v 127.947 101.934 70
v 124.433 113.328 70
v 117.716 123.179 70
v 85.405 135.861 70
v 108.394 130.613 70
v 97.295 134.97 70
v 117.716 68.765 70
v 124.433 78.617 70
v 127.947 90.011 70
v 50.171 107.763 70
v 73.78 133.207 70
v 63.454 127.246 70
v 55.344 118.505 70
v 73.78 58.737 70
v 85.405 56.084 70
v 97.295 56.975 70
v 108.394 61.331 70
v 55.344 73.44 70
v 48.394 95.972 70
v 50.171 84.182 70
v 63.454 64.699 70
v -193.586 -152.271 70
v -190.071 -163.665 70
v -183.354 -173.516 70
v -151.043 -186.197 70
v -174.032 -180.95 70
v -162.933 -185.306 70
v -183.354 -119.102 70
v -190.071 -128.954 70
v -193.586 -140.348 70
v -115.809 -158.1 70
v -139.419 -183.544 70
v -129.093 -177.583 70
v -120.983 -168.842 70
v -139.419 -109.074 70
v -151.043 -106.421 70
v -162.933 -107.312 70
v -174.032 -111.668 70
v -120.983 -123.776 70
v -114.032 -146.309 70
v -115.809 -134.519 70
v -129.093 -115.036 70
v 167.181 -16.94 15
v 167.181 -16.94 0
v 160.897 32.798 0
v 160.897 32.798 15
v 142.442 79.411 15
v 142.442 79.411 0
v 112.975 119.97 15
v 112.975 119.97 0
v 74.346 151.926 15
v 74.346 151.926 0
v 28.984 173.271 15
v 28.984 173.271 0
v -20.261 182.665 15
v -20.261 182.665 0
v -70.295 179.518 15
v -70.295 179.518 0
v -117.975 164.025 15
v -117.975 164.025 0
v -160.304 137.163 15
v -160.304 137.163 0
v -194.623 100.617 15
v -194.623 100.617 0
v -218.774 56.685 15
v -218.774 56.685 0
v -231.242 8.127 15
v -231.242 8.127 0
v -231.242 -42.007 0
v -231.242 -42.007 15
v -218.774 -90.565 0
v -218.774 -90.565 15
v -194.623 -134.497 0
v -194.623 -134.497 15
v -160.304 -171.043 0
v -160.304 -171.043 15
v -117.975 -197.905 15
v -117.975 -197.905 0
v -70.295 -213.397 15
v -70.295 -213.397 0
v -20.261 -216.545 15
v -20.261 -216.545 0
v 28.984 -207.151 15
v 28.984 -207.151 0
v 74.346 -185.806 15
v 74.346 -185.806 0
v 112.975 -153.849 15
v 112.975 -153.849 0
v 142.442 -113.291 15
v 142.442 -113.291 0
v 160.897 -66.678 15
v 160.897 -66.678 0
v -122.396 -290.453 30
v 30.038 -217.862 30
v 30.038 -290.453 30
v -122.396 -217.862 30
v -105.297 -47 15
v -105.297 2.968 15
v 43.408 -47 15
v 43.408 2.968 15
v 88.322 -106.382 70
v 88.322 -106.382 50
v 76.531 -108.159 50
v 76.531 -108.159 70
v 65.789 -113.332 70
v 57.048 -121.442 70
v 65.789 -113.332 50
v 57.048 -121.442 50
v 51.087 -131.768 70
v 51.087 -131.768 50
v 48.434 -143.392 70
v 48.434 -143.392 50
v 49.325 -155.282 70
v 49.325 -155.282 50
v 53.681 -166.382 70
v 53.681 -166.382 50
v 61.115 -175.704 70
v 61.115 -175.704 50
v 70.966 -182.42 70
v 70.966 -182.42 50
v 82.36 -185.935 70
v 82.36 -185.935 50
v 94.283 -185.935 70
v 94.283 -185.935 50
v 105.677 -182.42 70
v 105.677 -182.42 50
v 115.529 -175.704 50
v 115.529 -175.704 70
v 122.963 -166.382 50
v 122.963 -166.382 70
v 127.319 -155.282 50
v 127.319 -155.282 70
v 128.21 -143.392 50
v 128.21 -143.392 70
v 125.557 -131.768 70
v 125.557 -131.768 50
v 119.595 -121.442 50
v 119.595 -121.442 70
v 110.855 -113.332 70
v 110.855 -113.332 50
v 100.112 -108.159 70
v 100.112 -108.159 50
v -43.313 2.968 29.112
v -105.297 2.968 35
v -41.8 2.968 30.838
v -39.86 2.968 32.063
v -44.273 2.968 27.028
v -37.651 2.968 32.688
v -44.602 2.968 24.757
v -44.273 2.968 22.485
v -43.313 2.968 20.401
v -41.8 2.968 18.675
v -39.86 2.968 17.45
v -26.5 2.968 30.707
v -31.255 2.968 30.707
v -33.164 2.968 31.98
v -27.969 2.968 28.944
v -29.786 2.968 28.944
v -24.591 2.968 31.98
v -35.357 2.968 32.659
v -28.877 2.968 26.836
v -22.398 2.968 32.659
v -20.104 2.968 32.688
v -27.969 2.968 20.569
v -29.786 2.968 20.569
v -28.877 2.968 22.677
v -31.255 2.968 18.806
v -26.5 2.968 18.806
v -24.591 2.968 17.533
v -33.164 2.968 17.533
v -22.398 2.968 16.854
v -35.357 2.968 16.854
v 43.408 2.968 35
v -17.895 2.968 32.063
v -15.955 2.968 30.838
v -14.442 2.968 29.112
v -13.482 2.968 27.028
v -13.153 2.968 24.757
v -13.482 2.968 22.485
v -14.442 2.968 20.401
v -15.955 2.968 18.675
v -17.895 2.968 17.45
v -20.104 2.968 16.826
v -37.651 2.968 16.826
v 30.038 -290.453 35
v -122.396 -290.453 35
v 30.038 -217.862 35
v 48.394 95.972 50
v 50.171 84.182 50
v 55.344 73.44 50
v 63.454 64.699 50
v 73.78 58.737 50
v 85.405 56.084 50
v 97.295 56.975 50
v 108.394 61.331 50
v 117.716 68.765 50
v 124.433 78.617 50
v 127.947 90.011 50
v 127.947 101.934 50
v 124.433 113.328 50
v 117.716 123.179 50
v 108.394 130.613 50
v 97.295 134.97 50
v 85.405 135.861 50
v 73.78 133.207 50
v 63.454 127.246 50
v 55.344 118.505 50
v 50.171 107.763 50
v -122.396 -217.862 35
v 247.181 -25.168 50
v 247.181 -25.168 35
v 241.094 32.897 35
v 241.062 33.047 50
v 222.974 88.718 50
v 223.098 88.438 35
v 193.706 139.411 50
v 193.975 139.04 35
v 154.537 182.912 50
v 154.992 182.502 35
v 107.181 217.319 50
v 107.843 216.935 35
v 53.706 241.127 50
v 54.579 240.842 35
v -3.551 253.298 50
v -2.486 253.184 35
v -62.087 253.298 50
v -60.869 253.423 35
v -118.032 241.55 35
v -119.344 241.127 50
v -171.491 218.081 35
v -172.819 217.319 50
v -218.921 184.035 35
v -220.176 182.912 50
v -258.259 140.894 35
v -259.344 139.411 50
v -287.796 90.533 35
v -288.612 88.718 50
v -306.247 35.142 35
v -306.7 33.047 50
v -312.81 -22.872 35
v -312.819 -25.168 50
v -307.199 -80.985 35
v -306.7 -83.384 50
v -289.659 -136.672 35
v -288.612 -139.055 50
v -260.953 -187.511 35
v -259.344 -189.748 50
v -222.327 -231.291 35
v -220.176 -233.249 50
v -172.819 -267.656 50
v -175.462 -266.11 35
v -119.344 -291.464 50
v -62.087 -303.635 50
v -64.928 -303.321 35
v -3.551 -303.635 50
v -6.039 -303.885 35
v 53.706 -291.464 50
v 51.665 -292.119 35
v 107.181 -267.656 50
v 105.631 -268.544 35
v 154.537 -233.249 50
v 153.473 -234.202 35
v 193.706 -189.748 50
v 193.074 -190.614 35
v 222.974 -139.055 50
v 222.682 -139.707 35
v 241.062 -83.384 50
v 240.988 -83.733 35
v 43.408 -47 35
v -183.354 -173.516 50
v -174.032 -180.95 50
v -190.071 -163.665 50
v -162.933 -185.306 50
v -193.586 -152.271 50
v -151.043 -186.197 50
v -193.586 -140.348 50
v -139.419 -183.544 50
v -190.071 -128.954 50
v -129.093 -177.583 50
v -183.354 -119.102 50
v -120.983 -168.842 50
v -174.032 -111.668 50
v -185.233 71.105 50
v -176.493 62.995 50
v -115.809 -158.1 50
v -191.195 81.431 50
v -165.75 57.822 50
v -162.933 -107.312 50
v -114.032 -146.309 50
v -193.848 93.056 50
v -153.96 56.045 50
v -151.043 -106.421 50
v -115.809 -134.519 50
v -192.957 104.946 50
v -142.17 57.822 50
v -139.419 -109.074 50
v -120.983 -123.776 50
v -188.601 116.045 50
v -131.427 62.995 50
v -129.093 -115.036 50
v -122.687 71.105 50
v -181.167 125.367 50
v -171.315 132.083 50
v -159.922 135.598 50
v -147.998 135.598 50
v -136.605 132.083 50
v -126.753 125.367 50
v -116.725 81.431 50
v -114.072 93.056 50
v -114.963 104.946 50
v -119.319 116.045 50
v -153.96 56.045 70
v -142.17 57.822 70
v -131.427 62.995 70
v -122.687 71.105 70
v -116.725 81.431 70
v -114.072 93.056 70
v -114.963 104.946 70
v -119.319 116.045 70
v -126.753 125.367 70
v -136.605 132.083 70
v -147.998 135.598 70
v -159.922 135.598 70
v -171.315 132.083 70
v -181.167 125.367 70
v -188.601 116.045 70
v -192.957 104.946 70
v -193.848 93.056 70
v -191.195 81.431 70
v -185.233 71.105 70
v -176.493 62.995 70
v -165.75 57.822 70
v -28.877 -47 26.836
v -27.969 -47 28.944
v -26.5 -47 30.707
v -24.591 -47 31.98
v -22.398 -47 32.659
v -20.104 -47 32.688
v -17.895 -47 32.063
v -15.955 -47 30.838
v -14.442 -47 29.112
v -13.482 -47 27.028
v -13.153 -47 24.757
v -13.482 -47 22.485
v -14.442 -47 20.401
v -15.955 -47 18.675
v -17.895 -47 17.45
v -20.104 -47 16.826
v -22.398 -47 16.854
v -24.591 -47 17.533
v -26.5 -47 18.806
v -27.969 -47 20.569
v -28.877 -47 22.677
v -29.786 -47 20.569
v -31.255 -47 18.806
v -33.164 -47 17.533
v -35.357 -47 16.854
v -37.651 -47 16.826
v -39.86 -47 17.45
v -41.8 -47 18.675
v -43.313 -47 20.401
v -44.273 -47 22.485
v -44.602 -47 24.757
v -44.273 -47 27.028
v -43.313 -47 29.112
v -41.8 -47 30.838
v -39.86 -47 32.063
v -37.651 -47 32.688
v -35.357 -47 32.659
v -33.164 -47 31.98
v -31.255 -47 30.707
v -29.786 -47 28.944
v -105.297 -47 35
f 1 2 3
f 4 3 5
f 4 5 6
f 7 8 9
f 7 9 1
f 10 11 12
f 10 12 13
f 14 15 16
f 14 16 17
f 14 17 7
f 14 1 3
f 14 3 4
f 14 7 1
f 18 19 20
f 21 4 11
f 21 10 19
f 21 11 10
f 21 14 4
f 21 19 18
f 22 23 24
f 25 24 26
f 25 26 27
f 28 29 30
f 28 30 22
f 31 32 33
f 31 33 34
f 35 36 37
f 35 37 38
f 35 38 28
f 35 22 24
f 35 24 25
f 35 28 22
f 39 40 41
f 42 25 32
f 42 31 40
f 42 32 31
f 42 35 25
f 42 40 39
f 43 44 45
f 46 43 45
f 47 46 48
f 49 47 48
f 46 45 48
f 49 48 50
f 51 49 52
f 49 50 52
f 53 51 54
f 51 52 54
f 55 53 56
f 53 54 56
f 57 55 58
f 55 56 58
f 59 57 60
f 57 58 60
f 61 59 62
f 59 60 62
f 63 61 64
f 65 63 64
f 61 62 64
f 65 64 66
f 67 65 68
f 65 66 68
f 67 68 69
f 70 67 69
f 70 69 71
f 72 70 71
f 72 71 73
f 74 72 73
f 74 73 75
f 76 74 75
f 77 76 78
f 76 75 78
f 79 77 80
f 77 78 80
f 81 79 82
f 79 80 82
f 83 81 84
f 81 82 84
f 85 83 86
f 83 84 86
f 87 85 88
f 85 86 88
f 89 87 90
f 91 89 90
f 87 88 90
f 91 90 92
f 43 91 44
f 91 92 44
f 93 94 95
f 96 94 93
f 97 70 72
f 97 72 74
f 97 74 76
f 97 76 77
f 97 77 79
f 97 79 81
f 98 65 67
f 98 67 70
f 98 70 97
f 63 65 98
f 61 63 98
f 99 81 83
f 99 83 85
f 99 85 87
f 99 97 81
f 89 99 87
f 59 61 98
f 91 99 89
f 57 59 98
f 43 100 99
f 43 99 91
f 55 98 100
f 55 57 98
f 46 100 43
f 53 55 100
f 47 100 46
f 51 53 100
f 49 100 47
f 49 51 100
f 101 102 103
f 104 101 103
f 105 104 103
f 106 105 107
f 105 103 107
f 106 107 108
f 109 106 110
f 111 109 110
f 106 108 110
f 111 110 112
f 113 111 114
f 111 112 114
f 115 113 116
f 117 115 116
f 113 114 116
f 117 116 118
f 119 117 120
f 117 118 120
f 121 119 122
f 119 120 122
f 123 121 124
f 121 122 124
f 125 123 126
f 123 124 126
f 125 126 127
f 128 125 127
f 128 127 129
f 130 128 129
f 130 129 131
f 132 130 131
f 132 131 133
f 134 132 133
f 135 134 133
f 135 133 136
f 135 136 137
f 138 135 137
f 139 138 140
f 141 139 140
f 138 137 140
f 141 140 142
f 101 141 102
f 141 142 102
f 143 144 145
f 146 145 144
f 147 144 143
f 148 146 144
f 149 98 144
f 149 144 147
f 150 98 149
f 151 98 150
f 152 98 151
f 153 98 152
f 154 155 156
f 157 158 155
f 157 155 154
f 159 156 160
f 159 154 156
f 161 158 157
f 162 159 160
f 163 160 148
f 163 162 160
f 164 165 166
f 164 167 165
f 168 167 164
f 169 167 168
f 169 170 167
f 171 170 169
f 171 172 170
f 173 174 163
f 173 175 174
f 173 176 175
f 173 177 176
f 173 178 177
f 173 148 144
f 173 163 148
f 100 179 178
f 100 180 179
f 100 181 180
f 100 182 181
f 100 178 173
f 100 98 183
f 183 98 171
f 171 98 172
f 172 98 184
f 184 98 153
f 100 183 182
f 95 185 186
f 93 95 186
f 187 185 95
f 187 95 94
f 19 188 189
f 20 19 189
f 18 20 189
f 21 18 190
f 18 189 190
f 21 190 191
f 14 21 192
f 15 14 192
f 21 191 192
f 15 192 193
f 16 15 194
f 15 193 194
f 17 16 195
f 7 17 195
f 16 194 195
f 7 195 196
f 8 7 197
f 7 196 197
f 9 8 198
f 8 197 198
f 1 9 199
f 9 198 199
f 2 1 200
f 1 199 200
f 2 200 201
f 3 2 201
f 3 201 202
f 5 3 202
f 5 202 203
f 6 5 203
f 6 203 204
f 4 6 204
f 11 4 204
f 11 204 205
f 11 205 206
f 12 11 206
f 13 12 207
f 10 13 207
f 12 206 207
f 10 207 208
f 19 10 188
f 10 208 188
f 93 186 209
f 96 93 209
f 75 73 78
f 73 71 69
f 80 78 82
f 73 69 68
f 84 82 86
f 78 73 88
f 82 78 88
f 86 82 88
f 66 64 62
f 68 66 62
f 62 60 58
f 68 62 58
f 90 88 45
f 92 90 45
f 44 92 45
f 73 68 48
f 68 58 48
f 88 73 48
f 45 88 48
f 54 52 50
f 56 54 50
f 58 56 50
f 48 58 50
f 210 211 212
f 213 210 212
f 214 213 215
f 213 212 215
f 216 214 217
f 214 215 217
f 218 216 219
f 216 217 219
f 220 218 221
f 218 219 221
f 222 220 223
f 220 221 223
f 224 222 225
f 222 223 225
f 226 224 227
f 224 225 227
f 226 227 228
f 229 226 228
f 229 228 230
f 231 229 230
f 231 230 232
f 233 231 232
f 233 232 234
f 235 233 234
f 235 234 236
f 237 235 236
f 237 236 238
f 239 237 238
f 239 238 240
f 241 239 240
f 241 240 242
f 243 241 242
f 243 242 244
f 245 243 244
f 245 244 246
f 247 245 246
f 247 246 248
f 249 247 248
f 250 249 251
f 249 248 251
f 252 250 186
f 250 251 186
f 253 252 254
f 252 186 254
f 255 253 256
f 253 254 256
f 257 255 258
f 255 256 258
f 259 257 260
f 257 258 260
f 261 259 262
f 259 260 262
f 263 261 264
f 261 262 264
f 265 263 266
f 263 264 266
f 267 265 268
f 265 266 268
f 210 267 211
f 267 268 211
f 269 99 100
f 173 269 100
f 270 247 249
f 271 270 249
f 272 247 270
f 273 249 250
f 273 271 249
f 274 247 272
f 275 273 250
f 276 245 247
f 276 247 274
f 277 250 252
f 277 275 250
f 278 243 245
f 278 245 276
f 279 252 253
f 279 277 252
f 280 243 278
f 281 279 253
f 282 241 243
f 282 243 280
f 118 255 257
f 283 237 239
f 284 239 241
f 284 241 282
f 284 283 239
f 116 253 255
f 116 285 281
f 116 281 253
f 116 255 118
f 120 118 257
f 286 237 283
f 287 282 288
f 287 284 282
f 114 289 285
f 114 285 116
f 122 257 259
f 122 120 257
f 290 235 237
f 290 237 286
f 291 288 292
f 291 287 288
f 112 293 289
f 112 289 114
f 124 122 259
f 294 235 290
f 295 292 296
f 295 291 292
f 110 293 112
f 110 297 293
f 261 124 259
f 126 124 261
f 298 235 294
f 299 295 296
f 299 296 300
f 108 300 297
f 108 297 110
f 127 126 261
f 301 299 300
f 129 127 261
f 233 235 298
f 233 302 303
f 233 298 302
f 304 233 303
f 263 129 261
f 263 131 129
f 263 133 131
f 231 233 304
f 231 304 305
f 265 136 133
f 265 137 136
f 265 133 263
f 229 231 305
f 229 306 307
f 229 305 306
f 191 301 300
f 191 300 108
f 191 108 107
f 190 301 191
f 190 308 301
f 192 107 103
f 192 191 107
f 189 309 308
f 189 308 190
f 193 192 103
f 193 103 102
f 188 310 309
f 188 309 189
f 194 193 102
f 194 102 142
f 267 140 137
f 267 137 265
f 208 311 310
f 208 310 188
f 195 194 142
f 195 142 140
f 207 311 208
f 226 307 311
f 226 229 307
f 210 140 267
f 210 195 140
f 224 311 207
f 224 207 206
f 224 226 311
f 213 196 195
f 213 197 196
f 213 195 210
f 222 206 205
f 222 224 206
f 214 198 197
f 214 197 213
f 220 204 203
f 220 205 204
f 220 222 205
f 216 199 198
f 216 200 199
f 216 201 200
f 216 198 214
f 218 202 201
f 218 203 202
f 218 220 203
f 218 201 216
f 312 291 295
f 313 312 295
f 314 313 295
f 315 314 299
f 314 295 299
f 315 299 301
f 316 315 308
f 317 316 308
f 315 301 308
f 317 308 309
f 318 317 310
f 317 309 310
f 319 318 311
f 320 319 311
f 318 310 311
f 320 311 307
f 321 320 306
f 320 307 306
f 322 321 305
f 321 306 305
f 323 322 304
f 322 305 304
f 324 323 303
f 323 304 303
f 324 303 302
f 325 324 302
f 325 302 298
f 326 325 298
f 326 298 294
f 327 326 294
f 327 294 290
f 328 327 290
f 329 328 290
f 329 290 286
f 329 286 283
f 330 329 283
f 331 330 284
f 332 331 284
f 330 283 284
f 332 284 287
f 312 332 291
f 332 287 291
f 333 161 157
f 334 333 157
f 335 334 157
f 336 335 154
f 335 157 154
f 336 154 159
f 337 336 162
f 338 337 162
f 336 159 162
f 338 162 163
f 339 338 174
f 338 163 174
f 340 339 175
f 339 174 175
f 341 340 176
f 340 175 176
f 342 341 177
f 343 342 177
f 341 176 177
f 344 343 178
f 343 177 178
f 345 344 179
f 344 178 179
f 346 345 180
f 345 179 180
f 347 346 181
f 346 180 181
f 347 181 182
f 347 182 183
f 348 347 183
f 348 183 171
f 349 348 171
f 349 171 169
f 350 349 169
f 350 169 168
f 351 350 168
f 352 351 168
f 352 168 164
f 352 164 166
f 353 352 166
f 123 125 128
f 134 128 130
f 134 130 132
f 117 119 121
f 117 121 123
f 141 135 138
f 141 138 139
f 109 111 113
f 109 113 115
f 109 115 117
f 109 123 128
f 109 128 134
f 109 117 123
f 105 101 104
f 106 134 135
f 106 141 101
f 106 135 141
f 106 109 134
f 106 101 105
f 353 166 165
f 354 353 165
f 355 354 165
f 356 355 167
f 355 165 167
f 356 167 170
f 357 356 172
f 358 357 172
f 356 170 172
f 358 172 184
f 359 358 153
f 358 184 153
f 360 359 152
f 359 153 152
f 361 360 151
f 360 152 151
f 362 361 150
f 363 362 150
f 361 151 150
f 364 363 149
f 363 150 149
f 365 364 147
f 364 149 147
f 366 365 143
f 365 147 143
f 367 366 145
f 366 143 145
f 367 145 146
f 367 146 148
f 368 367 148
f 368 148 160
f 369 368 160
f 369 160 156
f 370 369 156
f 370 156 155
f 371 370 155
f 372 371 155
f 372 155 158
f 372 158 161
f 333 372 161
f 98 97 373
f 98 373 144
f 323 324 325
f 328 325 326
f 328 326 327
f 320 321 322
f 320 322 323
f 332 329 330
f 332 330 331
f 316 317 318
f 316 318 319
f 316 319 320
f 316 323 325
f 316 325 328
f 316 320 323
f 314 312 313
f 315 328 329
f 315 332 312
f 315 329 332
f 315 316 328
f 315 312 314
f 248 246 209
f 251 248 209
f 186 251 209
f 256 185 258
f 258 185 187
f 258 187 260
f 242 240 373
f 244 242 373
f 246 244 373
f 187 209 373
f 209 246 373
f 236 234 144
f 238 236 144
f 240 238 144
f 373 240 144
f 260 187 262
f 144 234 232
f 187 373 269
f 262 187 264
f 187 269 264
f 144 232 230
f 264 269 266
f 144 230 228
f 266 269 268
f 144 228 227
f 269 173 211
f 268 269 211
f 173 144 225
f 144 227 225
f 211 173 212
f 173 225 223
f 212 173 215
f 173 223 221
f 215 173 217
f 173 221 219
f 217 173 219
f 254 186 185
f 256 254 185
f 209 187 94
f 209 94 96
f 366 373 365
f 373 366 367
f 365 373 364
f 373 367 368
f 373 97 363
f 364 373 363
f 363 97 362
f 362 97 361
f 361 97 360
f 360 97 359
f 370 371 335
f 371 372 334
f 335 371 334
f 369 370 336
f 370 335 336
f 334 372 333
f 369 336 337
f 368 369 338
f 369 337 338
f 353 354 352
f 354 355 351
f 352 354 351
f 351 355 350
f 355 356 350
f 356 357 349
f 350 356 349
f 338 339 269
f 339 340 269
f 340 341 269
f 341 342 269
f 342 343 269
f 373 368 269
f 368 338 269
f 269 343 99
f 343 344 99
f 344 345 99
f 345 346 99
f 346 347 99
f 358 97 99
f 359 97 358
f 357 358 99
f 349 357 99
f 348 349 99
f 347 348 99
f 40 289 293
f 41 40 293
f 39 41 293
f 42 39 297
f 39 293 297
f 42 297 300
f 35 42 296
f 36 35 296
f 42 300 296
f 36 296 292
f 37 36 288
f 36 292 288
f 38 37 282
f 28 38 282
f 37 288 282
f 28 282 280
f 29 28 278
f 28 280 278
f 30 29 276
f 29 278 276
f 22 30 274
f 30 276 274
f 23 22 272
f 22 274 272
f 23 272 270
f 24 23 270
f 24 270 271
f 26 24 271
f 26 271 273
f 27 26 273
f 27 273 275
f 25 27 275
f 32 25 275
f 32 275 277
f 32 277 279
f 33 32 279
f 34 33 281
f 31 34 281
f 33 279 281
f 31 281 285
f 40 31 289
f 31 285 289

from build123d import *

# Parameters (mm, degrees)
SKETCH1_R           = 200
BOSS_EXTRUDE1_DEPTH = 15
SKETCH2_W           = 148.705267073
SKETCH2_H           = 49.968568036
BOSS_EXTRUDE2_DEPTH = 20
CUT_EXTRUDE2_DEPTH  = 103
SKETCH4_R           = 280
BOSS_EXTRUDE3_DEPTH = 15
SKETCH6_R           = 40
BOSS_EXTRUDE4_DEPTH = 20
CIRPATTERN1_COUNT   = 4
SKETCH7_W           = 152.434020428
SKETCH7_H           = 72.590976785
BOSS_EXTRUDE5_DEPTH = 5


with BuildPart() as part:
    # Sketch1 → Boss-Extrude1 (new body)
    with BuildSketch(Plane.XY):
        with Locations((-32.819152061, -16.939919955)):
            Circle(SKETCH1_R)
    extrude(amount=BOSS_EXTRUDE1_DEPTH)

    # Sketch2 → Boss-Extrude2 (add)
    with BuildSketch(Plane.XY.offset(15)):
        with Locations((-30.944542613, -22.016117064)):
            Rectangle(SKETCH2_W, SKETCH2_H)
    extrude(amount=BOSS_EXTRUDE2_DEPTH)

    # Sketch3 → Cut-Extrude2 (cut)
    with BuildSketch(Plane(origin=(0, 2.968166954, 0), x_dir=(1, 0, 0), z_dir=(0, 1, 0))):
        with BuildLine():
            ThreePointArc((-28.877479091, -22.677000866), (-44.602439558, -24.756660882), (-28.877479091, -26.836320898))
            ThreePointArc((-28.877479091, -26.836320898), (-13.152518624, -24.756660882), (-28.877479091, -22.677000866))
        make_face()
    extrude(amount=-CUT_EXTRUDE2_DEPTH, mode=Mode.SUBTRACT)

    # Sketch4 → Boss-Extrude3 (add)
    with BuildSketch(Plane.XY.offset(35)):
        with Locations((-32.819152061, -25.168448638)):
            Circle(SKETCH4_R)
    extrude(amount=BOSS_EXTRUDE3_DEPTH)

    # Sketch6 → Boss-Extrude4 (add)
    with BuildSketch(Plane.XY.offset(50)):
        with Locations((-154.032312031, -146.309301386)):
            Circle(SKETCH6_R)
    boss_extrude4 = extrude(amount=BOSS_EXTRUDE4_DEPTH)

    # CirPattern1: Boss-Extrude4 ×4 about axis
    cirpattern1_axis = Axis((-32.819152061, -25.168448638, 0), (0, 0, 1))
    for i in range(1, CIRPATTERN1_COUNT):
        add(boss_extrude4.rotate(cirpattern1_axis, i * 360 / CIRPATTERN1_COUNT))

    # Sketch7 → Boss-Extrude5 (add)
    with BuildSketch(Plane(origin=(0, 0, 35), x_dir=(-1, 0, 0), z_dir=(0, 0, -1))):
        with Locations((46.178823142, -254.15774716)):
            Rectangle(SKETCH7_W, SKETCH7_H)
    extrude(amount=BOSS_EXTRUDE5_DEPTH)


solid = part.part
